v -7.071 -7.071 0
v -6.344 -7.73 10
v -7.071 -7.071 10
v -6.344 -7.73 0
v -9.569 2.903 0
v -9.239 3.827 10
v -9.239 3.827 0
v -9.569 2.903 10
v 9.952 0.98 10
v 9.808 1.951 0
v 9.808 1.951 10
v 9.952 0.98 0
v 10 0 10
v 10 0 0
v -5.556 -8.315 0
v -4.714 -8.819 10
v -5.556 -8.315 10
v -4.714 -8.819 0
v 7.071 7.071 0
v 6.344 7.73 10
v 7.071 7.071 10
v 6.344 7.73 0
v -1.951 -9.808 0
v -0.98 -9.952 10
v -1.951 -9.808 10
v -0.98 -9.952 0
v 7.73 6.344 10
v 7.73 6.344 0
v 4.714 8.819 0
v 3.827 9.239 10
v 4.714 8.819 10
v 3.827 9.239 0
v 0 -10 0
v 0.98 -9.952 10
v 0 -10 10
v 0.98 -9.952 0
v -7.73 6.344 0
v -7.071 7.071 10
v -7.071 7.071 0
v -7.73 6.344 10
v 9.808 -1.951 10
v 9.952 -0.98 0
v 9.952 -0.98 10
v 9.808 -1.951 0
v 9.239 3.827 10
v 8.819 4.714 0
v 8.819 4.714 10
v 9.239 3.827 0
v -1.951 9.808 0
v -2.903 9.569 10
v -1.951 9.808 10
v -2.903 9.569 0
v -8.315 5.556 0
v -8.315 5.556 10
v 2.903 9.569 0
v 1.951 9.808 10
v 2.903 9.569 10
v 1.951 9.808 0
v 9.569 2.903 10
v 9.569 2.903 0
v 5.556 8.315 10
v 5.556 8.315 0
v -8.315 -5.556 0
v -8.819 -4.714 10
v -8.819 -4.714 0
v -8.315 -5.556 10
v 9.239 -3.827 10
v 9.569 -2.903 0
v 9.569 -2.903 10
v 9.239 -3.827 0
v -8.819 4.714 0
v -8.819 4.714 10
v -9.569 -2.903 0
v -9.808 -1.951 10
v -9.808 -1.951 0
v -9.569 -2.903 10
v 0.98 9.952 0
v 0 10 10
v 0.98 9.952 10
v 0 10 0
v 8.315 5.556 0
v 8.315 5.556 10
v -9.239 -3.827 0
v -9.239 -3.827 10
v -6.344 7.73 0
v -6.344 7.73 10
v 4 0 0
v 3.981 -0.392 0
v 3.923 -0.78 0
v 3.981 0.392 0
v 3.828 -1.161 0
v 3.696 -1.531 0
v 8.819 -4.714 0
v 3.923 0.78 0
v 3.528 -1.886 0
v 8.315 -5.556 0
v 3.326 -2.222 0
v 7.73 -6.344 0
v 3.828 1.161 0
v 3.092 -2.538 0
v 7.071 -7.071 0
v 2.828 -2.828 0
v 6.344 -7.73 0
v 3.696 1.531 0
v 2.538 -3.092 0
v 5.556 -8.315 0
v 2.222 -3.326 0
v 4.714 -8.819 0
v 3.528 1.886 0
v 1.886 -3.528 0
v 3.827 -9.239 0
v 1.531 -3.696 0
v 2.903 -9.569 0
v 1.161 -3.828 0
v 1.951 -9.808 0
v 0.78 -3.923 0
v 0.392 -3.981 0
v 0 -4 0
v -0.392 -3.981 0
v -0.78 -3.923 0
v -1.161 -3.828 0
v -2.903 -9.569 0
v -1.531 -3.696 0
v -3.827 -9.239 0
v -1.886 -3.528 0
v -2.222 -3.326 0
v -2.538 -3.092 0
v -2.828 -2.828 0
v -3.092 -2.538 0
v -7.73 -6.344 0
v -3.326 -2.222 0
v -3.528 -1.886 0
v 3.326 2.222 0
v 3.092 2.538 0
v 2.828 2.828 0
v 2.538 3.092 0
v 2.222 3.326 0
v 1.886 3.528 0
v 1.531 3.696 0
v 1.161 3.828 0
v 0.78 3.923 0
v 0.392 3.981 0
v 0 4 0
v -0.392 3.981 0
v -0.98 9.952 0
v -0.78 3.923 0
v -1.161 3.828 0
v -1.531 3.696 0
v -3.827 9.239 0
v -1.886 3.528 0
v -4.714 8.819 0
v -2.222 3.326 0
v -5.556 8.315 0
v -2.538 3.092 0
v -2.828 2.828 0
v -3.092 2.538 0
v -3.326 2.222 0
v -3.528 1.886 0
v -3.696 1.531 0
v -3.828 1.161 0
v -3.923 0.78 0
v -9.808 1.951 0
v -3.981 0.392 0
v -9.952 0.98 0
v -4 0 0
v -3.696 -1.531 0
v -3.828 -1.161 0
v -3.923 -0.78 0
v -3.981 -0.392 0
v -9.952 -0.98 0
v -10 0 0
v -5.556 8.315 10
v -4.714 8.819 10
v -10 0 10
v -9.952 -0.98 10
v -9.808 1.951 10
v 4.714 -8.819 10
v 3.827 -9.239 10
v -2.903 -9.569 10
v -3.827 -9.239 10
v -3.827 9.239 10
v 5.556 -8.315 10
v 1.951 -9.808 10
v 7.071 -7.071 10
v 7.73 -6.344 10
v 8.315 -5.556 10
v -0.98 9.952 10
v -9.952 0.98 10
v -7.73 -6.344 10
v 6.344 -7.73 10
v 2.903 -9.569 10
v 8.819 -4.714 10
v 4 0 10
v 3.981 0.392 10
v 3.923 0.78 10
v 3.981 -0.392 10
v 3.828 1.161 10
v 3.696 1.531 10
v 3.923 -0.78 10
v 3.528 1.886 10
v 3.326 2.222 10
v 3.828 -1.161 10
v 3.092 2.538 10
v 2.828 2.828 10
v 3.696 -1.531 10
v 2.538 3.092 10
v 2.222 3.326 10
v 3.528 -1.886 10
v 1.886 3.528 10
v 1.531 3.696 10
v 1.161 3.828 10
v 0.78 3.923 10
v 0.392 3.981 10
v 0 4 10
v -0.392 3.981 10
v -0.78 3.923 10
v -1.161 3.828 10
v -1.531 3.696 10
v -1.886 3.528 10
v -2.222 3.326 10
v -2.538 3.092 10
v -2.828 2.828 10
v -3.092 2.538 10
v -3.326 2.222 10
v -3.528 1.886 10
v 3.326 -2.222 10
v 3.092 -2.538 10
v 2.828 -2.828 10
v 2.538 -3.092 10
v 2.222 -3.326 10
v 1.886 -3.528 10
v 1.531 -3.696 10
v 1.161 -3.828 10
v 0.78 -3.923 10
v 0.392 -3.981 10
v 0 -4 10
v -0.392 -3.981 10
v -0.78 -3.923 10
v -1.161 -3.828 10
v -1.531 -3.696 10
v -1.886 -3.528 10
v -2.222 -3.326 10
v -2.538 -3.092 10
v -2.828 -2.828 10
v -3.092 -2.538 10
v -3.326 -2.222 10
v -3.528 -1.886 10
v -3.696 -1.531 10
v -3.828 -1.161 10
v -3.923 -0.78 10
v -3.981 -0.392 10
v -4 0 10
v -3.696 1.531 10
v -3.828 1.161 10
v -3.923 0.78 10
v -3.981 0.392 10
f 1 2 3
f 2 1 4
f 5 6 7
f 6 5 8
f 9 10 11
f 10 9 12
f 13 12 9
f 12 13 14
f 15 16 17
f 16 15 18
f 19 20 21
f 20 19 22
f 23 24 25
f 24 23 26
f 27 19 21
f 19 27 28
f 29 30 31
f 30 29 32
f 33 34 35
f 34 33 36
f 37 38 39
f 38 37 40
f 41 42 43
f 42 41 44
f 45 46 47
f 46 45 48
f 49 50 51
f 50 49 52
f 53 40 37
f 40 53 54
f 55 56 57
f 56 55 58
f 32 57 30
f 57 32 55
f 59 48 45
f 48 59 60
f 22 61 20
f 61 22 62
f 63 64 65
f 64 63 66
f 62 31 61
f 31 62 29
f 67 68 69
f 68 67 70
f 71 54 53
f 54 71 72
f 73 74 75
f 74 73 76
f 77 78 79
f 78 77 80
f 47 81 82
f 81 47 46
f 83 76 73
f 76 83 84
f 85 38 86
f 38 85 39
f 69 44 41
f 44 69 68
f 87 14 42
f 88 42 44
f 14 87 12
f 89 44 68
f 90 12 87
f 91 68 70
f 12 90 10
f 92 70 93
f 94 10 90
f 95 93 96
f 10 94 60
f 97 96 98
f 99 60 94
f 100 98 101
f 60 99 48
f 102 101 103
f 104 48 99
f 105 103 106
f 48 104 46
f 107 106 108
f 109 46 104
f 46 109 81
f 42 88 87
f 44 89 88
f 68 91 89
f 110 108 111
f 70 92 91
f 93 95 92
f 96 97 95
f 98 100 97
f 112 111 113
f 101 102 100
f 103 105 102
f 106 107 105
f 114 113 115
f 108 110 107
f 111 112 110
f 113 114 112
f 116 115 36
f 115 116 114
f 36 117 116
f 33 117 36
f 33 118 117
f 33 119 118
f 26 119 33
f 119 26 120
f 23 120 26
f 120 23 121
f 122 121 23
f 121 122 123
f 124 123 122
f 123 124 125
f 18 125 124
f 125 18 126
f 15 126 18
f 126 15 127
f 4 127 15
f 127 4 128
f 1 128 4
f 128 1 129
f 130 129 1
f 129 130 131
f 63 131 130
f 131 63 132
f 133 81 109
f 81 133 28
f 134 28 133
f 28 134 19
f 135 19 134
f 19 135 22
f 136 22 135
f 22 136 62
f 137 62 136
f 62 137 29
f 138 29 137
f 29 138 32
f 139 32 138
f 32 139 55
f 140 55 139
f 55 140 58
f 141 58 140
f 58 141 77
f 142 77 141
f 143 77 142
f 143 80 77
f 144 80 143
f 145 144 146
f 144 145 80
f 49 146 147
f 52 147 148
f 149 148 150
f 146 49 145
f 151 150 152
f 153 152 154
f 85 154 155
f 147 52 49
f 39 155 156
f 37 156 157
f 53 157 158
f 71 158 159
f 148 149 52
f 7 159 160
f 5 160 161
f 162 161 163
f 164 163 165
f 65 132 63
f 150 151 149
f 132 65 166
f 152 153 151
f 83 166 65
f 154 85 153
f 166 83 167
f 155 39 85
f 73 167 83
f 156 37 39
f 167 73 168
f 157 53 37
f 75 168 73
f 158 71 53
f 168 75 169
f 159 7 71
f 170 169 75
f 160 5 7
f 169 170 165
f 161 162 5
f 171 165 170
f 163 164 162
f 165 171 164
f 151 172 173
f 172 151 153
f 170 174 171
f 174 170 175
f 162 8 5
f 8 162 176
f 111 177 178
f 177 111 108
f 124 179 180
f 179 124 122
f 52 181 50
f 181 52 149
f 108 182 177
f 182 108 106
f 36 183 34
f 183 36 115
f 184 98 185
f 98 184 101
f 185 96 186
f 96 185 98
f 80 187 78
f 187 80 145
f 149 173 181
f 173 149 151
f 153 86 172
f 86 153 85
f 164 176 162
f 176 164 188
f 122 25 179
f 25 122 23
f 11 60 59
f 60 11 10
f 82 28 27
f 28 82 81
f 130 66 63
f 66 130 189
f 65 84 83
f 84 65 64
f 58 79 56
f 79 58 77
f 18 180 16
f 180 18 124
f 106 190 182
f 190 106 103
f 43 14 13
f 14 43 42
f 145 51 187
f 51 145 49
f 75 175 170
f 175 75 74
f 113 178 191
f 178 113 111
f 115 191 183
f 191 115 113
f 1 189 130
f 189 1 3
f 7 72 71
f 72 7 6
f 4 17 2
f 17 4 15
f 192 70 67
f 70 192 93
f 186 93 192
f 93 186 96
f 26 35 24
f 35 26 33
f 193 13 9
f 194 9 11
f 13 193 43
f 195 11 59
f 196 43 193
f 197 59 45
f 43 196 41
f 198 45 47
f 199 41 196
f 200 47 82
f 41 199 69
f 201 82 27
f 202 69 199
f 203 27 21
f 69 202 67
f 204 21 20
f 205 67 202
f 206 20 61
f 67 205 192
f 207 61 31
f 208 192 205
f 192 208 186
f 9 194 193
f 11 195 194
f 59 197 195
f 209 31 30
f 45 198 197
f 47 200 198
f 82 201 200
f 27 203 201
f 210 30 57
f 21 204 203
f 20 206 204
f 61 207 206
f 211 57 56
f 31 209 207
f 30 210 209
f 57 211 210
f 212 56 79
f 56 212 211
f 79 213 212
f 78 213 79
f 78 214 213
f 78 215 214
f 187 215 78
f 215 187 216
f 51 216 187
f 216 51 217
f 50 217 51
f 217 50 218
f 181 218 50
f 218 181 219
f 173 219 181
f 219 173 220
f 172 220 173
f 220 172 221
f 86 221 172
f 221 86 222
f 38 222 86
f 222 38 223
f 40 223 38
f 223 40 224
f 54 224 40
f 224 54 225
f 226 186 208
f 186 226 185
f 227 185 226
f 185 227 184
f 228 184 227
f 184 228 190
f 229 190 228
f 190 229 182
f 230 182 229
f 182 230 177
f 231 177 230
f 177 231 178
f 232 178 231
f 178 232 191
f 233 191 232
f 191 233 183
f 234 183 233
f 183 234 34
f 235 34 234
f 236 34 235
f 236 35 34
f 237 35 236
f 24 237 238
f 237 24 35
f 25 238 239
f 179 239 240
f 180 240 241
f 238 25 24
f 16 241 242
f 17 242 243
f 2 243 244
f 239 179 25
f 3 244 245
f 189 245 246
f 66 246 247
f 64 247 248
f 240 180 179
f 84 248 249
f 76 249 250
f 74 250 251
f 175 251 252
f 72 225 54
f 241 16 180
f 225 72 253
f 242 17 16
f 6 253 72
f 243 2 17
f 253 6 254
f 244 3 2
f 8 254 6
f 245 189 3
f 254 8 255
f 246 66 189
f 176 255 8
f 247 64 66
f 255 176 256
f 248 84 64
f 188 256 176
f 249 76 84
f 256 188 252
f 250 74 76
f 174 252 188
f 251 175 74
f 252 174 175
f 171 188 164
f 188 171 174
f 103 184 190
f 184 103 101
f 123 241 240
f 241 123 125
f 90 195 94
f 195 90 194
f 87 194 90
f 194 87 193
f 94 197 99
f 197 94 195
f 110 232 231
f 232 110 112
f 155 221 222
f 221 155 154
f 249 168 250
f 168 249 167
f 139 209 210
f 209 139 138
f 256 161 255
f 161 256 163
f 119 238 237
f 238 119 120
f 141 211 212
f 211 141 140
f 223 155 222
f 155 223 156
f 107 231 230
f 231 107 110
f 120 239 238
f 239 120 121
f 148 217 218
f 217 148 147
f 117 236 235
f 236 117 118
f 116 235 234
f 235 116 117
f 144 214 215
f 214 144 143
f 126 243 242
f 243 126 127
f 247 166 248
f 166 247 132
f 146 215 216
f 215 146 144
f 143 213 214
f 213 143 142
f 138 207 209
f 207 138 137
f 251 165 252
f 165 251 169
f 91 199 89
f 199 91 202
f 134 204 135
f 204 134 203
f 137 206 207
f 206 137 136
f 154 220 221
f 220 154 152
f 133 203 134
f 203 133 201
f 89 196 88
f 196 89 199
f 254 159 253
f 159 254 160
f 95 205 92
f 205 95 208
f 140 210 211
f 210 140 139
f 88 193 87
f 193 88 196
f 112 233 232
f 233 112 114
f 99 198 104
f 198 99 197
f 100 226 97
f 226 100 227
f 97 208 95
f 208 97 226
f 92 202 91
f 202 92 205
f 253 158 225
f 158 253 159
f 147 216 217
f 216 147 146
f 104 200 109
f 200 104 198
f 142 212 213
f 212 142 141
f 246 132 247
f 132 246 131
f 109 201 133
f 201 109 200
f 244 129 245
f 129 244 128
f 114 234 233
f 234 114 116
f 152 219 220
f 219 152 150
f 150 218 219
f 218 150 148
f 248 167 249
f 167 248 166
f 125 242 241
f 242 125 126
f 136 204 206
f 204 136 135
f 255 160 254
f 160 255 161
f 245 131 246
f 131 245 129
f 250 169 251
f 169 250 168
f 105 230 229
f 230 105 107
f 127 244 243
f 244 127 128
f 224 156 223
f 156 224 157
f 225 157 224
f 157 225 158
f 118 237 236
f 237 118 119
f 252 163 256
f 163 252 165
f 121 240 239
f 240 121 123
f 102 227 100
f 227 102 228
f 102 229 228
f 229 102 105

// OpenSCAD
// Test fixture: parametric round spacer (not a real library part)
outer_diameter = 20;
inner_diameter = 8;
height = 10;
$fn = 64;
difference() {
  cylinder(d = outer_diameter, h = height);
  translate([0, 0, -1]) cylinder(d = inner_diameter, h = height + 2);
}
